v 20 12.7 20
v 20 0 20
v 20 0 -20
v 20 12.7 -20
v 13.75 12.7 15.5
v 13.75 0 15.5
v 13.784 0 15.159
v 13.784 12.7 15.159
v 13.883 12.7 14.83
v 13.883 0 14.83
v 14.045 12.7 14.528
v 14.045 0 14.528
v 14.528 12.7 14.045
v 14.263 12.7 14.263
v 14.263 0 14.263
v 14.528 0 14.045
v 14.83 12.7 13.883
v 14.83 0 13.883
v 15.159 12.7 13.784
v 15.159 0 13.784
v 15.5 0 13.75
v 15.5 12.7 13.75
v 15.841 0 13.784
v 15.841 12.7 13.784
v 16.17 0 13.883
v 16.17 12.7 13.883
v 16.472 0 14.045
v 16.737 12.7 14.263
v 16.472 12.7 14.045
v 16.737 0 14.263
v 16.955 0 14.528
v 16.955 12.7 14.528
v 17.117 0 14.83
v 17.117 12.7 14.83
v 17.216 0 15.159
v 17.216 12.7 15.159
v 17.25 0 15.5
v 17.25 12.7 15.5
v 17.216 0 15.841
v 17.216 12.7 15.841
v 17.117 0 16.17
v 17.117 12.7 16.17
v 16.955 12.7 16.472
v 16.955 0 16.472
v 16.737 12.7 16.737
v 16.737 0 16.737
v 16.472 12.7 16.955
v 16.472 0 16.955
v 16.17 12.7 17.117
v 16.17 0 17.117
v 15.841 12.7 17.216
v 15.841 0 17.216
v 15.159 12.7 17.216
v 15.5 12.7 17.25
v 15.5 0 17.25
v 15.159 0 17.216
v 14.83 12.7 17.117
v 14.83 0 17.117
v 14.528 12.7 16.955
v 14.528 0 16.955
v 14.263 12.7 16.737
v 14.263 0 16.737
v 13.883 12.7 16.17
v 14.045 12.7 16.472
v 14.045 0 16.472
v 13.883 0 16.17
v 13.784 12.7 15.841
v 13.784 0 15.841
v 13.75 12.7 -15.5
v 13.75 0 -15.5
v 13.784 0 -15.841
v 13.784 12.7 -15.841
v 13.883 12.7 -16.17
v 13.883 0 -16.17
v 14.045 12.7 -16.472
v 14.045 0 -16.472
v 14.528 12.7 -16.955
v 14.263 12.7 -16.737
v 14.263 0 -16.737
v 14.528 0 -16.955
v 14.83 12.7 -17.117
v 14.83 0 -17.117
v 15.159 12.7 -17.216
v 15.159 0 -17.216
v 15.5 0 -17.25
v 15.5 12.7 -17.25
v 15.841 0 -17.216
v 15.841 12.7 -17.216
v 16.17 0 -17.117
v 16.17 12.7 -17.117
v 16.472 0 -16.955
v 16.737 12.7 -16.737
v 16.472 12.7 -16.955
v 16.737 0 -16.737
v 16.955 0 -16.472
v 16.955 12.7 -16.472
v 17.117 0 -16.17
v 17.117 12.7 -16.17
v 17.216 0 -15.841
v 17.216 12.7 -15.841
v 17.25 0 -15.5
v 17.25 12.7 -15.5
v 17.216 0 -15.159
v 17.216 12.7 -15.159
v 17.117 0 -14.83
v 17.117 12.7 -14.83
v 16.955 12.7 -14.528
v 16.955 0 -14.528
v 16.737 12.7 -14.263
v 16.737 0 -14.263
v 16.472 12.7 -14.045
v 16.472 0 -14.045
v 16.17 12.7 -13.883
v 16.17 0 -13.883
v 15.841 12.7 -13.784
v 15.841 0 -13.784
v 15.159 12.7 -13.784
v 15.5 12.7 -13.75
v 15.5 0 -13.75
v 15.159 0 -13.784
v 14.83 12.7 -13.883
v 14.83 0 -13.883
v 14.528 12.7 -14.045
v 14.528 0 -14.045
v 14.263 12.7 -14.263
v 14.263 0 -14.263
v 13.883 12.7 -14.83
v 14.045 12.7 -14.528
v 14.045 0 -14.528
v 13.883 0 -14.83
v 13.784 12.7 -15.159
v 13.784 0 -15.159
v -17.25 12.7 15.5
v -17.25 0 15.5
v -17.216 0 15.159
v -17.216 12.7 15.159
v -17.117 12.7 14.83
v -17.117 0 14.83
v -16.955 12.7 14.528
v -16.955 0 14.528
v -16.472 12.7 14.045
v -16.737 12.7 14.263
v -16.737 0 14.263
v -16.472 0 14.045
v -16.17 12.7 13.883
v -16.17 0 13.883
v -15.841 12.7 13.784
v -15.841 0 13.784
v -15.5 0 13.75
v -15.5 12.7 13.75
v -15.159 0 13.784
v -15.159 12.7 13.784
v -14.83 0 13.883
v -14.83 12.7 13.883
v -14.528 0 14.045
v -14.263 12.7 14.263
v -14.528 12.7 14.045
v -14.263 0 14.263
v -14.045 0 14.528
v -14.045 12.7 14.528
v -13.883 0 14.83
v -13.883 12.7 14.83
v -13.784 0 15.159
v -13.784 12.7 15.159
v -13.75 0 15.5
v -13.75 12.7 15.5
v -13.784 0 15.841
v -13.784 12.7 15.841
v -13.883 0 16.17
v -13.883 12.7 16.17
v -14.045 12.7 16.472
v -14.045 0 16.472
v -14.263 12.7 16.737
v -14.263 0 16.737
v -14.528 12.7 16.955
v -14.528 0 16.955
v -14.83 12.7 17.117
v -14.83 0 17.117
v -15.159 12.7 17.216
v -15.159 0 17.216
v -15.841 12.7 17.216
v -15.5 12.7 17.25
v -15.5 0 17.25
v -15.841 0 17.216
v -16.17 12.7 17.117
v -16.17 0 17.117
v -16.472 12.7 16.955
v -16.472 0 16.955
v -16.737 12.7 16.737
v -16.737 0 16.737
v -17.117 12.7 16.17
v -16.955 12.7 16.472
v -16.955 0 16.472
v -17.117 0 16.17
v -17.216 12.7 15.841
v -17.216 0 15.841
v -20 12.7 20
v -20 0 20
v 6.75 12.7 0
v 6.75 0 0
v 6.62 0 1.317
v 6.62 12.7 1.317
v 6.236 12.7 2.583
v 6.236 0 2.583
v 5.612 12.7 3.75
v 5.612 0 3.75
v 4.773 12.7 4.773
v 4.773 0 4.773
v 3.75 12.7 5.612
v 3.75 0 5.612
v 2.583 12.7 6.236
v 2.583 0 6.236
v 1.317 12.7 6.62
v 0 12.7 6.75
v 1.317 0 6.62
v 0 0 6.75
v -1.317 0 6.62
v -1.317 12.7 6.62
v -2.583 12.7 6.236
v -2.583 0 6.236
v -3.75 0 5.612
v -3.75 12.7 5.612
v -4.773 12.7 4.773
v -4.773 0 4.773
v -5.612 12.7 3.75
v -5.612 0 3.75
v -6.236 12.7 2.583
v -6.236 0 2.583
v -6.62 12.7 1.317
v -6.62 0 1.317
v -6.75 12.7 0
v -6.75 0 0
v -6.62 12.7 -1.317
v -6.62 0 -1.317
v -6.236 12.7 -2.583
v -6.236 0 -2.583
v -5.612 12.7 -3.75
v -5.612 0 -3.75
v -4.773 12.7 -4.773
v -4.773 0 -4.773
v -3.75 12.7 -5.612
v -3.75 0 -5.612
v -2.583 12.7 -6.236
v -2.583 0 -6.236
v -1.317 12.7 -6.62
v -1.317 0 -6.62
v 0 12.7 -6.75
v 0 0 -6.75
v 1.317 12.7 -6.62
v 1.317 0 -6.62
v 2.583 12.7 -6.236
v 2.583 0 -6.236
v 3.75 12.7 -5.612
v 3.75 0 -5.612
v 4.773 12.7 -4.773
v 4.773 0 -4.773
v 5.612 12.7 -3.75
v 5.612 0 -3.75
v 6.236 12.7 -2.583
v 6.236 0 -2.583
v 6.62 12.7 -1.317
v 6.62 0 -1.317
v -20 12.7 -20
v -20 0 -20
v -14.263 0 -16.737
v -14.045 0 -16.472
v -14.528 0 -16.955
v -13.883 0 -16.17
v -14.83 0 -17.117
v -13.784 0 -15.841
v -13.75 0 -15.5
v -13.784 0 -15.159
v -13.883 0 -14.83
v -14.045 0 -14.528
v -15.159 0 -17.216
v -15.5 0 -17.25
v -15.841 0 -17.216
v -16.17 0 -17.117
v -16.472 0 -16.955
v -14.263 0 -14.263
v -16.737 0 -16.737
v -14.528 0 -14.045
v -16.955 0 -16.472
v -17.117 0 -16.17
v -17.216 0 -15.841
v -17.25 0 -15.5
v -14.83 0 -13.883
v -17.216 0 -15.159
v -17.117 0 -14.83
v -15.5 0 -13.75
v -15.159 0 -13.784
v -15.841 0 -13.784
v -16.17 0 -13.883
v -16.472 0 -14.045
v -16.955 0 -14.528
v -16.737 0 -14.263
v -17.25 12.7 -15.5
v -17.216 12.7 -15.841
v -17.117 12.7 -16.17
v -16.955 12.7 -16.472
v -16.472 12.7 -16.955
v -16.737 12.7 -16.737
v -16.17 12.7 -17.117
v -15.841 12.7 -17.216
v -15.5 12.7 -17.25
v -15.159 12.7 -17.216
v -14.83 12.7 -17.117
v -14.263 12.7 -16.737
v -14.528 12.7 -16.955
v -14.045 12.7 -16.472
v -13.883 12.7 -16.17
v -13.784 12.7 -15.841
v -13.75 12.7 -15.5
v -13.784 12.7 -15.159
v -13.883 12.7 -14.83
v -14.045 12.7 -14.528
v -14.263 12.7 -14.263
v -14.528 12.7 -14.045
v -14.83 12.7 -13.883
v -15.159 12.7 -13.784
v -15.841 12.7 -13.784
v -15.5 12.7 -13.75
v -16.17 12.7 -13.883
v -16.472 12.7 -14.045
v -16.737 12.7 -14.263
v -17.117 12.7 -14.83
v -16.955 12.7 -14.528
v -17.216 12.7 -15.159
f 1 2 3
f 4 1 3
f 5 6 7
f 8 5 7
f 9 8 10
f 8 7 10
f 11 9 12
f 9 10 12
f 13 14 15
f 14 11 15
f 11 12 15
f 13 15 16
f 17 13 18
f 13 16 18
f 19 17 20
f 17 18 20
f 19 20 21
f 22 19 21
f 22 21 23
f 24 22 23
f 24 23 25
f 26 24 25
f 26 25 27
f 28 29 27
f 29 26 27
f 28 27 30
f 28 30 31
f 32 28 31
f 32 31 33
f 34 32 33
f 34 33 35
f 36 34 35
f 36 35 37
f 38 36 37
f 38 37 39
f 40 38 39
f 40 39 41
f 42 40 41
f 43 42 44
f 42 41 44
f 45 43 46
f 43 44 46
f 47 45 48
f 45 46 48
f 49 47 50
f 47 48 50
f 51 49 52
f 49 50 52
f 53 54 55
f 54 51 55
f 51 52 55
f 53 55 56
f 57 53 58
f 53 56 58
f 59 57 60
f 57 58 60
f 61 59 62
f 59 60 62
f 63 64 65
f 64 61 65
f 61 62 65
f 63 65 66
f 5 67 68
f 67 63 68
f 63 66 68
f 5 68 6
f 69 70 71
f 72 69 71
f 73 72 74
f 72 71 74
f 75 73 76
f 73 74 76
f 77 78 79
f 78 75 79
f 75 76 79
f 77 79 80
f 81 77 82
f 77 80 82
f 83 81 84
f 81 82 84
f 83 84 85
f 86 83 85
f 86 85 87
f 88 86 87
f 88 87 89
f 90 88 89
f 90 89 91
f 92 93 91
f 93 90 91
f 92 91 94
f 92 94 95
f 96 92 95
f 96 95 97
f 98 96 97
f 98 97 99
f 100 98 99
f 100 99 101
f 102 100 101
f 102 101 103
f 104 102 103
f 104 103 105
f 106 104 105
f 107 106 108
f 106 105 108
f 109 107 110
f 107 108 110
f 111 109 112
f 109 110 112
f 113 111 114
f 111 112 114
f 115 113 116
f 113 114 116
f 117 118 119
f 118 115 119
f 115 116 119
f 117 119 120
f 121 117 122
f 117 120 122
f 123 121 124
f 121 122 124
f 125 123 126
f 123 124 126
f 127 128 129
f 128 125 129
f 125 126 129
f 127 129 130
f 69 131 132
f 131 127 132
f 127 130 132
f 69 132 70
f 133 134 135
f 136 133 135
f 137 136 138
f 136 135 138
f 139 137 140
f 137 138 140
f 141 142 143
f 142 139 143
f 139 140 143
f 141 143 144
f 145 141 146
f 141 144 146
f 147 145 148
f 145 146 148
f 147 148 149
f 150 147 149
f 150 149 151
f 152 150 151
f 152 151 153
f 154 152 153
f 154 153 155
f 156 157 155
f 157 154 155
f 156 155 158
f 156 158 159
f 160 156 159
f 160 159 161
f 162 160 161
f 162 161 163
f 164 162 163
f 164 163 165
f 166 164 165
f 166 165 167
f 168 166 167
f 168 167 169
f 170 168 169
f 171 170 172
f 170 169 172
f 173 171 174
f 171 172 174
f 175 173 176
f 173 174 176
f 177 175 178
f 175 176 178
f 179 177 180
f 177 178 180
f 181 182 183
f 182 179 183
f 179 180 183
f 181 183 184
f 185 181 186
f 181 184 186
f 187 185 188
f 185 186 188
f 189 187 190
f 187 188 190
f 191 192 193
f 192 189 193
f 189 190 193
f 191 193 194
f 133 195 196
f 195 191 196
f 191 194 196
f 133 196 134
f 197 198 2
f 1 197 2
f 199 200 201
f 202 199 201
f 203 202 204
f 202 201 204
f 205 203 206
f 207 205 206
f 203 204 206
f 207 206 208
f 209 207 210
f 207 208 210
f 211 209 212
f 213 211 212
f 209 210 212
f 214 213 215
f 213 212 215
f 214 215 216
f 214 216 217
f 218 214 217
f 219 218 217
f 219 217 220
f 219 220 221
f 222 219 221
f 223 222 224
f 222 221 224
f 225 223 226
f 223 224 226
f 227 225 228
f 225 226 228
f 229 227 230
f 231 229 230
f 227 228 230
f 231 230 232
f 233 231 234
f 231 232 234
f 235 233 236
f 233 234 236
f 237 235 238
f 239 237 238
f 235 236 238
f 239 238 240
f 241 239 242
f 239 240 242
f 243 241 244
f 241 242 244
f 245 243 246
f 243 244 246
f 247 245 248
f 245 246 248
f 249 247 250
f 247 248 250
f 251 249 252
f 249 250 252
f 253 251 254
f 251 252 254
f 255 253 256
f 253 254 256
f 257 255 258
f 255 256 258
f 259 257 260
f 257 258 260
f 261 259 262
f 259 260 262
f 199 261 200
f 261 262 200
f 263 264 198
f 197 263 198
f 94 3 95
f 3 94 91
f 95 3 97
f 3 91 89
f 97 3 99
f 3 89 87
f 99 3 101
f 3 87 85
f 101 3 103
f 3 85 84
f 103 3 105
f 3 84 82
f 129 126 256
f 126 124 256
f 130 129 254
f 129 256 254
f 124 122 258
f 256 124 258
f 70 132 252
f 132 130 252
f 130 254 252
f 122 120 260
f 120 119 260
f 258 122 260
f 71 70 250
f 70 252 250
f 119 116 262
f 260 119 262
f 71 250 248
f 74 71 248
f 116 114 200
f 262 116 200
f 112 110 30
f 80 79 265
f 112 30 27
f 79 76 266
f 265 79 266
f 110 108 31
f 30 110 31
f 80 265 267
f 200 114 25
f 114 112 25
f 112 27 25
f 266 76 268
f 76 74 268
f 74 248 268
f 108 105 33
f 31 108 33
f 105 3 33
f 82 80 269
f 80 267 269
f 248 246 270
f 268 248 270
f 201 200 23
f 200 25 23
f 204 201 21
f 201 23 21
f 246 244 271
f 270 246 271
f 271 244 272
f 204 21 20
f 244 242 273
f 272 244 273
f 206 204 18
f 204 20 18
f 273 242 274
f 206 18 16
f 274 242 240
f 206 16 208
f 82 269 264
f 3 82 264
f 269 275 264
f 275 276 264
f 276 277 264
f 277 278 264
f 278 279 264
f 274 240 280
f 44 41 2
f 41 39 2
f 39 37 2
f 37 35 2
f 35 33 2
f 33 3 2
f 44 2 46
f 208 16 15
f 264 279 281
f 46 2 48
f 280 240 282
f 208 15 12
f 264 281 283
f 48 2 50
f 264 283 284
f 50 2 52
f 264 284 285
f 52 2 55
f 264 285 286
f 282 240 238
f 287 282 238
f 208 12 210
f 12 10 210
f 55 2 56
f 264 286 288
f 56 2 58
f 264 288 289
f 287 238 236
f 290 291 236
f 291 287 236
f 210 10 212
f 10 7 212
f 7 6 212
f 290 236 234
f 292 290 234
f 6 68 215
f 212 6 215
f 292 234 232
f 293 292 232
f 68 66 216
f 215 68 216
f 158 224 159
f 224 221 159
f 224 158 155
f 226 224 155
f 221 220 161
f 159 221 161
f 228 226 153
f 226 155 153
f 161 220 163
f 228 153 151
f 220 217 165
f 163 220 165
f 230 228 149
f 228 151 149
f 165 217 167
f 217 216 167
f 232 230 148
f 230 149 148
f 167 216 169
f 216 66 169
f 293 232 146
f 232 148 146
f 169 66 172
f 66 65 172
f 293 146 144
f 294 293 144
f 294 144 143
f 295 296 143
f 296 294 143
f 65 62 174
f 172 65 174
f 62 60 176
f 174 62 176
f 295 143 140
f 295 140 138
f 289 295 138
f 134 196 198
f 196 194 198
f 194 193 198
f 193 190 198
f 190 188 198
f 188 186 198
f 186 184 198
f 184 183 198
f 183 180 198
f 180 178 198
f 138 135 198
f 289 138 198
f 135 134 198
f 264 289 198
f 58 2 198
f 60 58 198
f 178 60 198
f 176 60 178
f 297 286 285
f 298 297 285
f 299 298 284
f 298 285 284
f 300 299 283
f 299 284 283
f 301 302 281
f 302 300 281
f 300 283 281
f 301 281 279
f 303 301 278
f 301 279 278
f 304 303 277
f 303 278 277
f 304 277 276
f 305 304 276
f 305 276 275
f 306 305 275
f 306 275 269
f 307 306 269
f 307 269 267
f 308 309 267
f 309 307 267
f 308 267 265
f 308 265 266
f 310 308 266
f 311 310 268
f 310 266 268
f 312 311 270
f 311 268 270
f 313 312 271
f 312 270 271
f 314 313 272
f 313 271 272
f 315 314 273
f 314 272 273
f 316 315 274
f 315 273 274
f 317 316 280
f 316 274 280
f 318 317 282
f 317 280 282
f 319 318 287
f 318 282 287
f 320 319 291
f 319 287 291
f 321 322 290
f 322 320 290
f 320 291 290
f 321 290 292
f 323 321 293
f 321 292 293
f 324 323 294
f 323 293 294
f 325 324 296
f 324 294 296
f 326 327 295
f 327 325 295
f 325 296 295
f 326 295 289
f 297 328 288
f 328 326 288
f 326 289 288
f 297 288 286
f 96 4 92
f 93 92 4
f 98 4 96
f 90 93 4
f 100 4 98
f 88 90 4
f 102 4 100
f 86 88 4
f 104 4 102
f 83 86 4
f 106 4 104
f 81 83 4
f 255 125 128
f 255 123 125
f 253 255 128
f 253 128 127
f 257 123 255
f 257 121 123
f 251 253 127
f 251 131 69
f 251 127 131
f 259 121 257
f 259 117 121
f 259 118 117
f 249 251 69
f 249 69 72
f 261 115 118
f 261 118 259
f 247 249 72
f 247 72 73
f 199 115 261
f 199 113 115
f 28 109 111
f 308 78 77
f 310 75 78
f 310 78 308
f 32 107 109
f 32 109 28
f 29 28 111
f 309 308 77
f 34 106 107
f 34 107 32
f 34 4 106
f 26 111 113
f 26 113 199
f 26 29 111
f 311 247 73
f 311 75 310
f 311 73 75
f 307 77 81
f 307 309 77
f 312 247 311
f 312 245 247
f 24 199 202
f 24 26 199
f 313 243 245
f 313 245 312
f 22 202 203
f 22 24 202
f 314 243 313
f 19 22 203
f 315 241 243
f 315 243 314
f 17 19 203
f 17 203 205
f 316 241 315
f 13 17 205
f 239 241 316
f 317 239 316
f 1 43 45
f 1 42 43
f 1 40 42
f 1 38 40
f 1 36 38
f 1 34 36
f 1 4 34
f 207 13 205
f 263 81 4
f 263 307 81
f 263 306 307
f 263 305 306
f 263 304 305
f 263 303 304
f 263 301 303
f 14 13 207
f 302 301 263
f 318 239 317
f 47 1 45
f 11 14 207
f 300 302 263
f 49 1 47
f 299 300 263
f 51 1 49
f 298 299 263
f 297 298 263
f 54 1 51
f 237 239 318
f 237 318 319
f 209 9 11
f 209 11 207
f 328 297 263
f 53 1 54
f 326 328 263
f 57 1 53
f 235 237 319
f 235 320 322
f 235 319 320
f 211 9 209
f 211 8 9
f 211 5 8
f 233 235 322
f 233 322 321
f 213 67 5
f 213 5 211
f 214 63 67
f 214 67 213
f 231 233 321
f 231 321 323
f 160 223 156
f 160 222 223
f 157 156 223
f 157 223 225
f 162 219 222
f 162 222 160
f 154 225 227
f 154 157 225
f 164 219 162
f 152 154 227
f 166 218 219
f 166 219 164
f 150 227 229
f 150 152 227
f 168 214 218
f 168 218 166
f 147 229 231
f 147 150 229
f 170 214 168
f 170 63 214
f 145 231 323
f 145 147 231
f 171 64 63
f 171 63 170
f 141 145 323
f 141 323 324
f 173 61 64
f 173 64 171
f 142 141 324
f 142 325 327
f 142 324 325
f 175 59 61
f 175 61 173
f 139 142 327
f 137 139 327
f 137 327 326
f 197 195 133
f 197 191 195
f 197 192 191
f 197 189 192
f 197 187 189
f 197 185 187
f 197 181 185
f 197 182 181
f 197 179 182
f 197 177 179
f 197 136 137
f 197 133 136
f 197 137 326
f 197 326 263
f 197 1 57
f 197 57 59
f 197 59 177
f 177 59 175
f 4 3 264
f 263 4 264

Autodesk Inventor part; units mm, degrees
ref_plane "YZ Plane" through (0, 0, 0) normal (1, 0, 0) x (0, 1, 0)
ref_plane "XZ Plane" through (0, 0, 0) normal (0, 1, 0) x (-1, 0, 0)
ref_plane "XY Plane" through (0, 0, 0) normal (0, 0, 1) x (1, 0, 0)
sketch "Sketch1" plane through (0, 0, 0) normal (0, 1, 0) x (-1, 0, 0)
  line L0 (-20, -20) -> (20, -20)
  line L1 (20, -20) -> (20, 20)
  line L2 (20, 20) -> (-20, 20)
  line L3 (-20, 20) -> (-20, -20)
  line L4 (-20, -20) -> (20, 20) construction
  line L5 (20, -20) -> (-20, 20) construction
  circle A0 centre (15.5, 15.5) radius 1.75
  line L6 (20, 0) -> (-20, 0)
  line L7 (0, -20) -> (0, 20)
  circle A1 centre (15.5, -15.5) radius 1.75
  circle A2 centre (-15.5, 15.5) radius 1.75
  circle A3 centre (-15.5, -15.5) radius 1.75
  point P0 (0, 0)
  dimension "d3" = 40
  dimension "d4" = 40
  dimension "d5" = 3.5
  dimension "d10" = 31
  dimension "d11" = 31
extrude "Extrusion2" add sketch "Sketch1" along normal blind 12.7
sketch "Sketch2" plane through (0, 0, 0) normal (0, -1, 0) x (1, 0, 0)
  circle A0 centre (0, 0) radius 6.75
  dimension "d12" = 13.5
extrude "Extrusion3" cut sketch "Sketch2" against normal through all
properties part number "Lead_Screw_Thrust_Bearing_Mount"
